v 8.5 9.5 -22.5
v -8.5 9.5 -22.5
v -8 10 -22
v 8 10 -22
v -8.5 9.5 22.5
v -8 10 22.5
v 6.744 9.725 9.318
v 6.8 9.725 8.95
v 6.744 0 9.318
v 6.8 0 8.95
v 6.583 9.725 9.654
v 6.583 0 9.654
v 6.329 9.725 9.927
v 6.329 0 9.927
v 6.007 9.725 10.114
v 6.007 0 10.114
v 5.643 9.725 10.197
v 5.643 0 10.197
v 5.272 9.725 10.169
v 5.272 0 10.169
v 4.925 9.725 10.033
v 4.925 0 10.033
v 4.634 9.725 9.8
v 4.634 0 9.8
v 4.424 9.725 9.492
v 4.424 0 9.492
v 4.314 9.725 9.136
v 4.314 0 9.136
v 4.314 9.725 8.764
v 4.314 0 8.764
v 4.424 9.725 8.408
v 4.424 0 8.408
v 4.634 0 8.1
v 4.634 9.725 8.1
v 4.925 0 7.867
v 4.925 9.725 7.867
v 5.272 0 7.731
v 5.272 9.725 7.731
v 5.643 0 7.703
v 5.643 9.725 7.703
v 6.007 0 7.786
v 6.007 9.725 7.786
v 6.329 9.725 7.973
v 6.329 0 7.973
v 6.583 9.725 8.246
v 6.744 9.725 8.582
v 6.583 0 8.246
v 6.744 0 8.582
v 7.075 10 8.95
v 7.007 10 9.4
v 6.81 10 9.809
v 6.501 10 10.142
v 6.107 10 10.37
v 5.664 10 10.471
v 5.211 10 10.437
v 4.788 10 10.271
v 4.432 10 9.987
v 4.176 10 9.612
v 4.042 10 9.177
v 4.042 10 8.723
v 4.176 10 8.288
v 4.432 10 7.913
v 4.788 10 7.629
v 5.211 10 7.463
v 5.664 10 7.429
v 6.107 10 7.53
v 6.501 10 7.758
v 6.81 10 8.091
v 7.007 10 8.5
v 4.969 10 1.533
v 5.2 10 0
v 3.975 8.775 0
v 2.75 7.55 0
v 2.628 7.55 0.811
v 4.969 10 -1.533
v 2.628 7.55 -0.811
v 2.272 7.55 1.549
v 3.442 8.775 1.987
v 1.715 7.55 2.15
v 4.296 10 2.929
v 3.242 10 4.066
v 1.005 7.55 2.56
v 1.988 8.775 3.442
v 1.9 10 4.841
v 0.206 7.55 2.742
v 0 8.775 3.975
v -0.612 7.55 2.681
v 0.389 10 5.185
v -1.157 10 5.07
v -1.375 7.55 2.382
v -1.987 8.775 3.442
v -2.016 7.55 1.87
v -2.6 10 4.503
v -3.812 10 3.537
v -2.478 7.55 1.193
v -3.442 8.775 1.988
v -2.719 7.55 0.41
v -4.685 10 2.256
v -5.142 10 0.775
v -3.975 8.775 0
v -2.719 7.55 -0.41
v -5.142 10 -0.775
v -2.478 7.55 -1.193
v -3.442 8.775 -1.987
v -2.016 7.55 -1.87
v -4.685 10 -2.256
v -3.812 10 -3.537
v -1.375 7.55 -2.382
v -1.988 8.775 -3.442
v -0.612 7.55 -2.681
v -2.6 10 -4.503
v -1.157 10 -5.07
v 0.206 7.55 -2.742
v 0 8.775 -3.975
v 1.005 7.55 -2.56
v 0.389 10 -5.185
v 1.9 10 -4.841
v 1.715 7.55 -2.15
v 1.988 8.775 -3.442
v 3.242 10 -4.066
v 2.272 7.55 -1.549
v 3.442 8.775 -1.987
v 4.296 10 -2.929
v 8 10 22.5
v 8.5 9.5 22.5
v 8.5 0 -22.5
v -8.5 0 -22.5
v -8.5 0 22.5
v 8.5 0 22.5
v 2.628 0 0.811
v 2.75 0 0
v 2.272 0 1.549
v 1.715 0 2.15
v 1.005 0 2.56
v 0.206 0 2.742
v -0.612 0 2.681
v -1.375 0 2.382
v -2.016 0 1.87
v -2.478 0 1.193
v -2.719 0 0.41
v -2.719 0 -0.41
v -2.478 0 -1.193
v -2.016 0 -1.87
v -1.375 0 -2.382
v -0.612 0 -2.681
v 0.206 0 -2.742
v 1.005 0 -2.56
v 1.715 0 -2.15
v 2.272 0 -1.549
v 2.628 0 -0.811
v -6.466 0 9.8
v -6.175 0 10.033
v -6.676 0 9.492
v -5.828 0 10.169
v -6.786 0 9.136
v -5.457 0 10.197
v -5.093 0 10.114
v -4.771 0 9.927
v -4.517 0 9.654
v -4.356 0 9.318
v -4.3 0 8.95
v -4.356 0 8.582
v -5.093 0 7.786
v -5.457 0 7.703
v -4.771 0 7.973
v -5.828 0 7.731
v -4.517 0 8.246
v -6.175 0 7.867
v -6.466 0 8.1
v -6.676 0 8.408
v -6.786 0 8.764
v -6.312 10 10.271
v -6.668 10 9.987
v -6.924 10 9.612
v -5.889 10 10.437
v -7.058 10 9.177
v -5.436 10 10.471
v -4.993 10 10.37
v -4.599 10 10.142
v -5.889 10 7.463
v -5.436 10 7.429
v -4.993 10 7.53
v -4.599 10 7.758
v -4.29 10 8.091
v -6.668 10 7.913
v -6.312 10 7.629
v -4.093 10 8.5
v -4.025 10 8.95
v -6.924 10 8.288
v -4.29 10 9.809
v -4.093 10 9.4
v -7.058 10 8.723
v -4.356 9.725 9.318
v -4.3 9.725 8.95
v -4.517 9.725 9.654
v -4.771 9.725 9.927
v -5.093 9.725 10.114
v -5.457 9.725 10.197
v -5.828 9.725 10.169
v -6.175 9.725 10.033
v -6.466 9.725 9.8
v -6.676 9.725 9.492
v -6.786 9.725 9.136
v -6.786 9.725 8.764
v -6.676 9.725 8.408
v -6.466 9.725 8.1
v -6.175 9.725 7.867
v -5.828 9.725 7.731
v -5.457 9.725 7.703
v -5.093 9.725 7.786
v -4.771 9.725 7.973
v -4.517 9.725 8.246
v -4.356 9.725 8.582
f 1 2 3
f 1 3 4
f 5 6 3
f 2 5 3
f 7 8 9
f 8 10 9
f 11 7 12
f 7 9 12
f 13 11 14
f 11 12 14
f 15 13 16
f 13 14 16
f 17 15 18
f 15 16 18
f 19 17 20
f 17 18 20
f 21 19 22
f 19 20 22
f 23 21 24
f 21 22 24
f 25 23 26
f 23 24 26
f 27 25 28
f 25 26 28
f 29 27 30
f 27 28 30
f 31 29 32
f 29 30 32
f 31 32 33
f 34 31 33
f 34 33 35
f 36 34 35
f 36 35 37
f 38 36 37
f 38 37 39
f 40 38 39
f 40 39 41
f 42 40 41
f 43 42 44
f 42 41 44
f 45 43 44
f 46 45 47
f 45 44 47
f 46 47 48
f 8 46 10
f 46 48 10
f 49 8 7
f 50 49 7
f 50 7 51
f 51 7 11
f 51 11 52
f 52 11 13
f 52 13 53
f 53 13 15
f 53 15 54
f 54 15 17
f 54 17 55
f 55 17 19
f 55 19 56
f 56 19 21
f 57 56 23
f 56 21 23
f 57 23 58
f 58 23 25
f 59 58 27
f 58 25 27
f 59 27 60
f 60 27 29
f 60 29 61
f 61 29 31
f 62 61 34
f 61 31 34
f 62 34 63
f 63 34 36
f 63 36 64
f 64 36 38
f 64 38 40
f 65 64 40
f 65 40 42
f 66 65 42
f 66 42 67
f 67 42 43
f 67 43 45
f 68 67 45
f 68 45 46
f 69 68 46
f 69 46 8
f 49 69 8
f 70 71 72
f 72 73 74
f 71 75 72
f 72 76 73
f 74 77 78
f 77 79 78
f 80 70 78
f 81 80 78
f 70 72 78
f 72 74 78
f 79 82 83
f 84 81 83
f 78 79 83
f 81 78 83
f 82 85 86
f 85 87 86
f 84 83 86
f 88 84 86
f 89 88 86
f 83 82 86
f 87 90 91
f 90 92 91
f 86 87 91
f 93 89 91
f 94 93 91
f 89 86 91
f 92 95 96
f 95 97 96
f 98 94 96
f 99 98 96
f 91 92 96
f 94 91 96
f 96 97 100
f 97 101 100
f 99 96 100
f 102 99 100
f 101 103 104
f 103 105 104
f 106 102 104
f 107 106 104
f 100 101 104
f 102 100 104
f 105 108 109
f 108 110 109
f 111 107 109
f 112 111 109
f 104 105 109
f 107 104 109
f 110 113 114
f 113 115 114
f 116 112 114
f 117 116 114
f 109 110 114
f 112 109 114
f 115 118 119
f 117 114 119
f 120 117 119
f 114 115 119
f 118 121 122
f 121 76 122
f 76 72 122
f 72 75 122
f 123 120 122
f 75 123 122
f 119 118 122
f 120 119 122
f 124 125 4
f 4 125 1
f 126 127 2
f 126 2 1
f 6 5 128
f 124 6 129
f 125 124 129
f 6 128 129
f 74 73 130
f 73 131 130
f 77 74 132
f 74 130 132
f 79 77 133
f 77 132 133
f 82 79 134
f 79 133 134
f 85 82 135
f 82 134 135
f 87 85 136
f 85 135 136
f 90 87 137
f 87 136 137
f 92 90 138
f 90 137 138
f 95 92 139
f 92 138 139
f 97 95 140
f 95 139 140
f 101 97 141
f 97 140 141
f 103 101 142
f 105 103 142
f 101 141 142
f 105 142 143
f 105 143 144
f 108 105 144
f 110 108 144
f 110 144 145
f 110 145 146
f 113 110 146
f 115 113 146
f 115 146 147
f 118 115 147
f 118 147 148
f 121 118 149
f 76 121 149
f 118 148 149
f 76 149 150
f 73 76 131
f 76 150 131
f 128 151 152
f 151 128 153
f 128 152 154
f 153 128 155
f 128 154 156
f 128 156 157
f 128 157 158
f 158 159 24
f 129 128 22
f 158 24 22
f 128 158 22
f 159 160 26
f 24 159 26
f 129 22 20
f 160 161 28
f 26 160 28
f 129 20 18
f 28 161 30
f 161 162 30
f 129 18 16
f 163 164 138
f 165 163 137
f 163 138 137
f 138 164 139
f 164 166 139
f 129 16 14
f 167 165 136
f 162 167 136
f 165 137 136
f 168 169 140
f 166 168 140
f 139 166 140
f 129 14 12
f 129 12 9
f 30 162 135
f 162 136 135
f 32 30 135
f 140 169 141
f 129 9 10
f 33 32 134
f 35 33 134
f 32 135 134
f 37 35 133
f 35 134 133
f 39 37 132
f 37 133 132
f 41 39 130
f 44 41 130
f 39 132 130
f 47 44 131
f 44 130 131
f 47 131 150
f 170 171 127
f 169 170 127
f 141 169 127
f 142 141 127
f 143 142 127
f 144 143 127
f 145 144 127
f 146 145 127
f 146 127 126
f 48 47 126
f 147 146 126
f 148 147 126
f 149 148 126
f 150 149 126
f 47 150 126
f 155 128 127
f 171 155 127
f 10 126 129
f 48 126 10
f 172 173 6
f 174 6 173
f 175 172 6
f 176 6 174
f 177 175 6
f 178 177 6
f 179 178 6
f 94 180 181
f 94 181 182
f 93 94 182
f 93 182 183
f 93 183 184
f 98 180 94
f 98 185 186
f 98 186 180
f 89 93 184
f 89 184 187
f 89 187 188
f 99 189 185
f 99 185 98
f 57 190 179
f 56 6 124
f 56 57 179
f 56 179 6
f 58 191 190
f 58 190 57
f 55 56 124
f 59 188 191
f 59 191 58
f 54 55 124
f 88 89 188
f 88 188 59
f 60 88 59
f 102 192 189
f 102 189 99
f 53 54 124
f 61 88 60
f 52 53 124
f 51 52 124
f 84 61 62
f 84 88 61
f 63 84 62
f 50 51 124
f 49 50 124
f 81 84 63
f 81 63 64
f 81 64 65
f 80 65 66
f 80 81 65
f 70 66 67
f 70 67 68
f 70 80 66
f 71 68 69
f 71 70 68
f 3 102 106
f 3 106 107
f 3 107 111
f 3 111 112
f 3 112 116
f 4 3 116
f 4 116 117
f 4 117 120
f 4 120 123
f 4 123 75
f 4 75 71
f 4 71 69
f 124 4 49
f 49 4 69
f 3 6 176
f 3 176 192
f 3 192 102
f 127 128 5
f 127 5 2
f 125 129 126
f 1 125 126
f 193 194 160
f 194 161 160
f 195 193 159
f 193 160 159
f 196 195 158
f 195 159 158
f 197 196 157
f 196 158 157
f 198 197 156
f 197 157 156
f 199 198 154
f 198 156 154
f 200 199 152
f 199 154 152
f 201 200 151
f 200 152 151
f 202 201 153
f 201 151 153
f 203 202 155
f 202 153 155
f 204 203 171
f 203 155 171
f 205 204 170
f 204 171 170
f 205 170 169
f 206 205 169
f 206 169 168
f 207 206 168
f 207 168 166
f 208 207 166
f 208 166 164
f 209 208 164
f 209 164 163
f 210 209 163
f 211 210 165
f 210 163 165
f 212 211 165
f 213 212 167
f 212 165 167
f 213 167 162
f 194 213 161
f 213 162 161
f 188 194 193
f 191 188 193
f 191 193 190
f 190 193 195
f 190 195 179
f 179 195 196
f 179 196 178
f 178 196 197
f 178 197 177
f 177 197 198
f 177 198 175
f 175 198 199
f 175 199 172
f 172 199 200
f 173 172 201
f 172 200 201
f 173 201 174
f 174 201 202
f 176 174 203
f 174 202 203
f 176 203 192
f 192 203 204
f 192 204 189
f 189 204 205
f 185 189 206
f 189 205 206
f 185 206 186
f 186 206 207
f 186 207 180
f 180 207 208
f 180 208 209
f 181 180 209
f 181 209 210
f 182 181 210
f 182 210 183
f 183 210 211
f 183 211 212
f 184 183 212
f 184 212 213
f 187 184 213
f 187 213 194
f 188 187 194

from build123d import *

# Parameters (mm, degrees)
SKETCH_1_W                    = 17
SKETCH_1_H                    = 45
EXTRUDE_293_DEPTH             = 10
HOLE_WIZARD_40_M5_D           = 5.5
HOLE_WIZARD_40_M5_CSINK_D     = 10.4
HOLE_WIZARD_40_M5_CSINK_ANGLE = 90
HOLE_WIZARD_1122_D            = 2.5
HOLE_WIZARD_1122_CSINK_D      = 3.05
HOLE_WIZARD_1122_CSINK_ANGLE  = 90
CHAMFER_1_SIZE                = 0.5


with BuildPart() as part:
    # Эскиз1 → Extrude 293 (new body)
    with BuildSketch(Plane(origin=(0, 0, 0), x_dir=(1, 0, 0), z_dir=(0, 1, 0))):
        Rectangle(SKETCH_1_W, SKETCH_1_H)
    extrude(amount=EXTRUDE_293_DEPTH)

    # Крепление к профилю 40 - M5 (through all)
    with Locations(Plane(origin=(0, 10, 0), x_dir=(-1, 0, 0), z_dir=(0, 1, 0))):
        with Locations((0, 0)):
            CounterSinkHole(HOLE_WIZARD_40_M5_D / 2, HOLE_WIZARD_40_M5_CSINK_D / 2, counter_sink_angle=HOLE_WIZARD_40_M5_CSINK_ANGLE)

    # Hole Wizard 1122 (through all)
    with Locations(Plane(origin=(0, 10, 0), x_dir=(-1, 0, 0), z_dir=(0, 1, 0))):
        with Locations((5.55, 8.95), (-5.55, 8.95)):
            CounterSinkHole(HOLE_WIZARD_1122_D / 2, HOLE_WIZARD_1122_CSINK_D / 2, counter_sink_angle=HOLE_WIZARD_1122_CSINK_ANGLE)

    # Фаска1
    chamfer_1_edges = [part.edges().sort_by_distance(p)[0] for p in [
        (-8.5, 10, 0),
        (8.5, 10, 0),
        (0, 10, -22.5),
    ]]
    chamfer(chamfer_1_edges, length=CHAMFER_1_SIZE)


solid = part.part
